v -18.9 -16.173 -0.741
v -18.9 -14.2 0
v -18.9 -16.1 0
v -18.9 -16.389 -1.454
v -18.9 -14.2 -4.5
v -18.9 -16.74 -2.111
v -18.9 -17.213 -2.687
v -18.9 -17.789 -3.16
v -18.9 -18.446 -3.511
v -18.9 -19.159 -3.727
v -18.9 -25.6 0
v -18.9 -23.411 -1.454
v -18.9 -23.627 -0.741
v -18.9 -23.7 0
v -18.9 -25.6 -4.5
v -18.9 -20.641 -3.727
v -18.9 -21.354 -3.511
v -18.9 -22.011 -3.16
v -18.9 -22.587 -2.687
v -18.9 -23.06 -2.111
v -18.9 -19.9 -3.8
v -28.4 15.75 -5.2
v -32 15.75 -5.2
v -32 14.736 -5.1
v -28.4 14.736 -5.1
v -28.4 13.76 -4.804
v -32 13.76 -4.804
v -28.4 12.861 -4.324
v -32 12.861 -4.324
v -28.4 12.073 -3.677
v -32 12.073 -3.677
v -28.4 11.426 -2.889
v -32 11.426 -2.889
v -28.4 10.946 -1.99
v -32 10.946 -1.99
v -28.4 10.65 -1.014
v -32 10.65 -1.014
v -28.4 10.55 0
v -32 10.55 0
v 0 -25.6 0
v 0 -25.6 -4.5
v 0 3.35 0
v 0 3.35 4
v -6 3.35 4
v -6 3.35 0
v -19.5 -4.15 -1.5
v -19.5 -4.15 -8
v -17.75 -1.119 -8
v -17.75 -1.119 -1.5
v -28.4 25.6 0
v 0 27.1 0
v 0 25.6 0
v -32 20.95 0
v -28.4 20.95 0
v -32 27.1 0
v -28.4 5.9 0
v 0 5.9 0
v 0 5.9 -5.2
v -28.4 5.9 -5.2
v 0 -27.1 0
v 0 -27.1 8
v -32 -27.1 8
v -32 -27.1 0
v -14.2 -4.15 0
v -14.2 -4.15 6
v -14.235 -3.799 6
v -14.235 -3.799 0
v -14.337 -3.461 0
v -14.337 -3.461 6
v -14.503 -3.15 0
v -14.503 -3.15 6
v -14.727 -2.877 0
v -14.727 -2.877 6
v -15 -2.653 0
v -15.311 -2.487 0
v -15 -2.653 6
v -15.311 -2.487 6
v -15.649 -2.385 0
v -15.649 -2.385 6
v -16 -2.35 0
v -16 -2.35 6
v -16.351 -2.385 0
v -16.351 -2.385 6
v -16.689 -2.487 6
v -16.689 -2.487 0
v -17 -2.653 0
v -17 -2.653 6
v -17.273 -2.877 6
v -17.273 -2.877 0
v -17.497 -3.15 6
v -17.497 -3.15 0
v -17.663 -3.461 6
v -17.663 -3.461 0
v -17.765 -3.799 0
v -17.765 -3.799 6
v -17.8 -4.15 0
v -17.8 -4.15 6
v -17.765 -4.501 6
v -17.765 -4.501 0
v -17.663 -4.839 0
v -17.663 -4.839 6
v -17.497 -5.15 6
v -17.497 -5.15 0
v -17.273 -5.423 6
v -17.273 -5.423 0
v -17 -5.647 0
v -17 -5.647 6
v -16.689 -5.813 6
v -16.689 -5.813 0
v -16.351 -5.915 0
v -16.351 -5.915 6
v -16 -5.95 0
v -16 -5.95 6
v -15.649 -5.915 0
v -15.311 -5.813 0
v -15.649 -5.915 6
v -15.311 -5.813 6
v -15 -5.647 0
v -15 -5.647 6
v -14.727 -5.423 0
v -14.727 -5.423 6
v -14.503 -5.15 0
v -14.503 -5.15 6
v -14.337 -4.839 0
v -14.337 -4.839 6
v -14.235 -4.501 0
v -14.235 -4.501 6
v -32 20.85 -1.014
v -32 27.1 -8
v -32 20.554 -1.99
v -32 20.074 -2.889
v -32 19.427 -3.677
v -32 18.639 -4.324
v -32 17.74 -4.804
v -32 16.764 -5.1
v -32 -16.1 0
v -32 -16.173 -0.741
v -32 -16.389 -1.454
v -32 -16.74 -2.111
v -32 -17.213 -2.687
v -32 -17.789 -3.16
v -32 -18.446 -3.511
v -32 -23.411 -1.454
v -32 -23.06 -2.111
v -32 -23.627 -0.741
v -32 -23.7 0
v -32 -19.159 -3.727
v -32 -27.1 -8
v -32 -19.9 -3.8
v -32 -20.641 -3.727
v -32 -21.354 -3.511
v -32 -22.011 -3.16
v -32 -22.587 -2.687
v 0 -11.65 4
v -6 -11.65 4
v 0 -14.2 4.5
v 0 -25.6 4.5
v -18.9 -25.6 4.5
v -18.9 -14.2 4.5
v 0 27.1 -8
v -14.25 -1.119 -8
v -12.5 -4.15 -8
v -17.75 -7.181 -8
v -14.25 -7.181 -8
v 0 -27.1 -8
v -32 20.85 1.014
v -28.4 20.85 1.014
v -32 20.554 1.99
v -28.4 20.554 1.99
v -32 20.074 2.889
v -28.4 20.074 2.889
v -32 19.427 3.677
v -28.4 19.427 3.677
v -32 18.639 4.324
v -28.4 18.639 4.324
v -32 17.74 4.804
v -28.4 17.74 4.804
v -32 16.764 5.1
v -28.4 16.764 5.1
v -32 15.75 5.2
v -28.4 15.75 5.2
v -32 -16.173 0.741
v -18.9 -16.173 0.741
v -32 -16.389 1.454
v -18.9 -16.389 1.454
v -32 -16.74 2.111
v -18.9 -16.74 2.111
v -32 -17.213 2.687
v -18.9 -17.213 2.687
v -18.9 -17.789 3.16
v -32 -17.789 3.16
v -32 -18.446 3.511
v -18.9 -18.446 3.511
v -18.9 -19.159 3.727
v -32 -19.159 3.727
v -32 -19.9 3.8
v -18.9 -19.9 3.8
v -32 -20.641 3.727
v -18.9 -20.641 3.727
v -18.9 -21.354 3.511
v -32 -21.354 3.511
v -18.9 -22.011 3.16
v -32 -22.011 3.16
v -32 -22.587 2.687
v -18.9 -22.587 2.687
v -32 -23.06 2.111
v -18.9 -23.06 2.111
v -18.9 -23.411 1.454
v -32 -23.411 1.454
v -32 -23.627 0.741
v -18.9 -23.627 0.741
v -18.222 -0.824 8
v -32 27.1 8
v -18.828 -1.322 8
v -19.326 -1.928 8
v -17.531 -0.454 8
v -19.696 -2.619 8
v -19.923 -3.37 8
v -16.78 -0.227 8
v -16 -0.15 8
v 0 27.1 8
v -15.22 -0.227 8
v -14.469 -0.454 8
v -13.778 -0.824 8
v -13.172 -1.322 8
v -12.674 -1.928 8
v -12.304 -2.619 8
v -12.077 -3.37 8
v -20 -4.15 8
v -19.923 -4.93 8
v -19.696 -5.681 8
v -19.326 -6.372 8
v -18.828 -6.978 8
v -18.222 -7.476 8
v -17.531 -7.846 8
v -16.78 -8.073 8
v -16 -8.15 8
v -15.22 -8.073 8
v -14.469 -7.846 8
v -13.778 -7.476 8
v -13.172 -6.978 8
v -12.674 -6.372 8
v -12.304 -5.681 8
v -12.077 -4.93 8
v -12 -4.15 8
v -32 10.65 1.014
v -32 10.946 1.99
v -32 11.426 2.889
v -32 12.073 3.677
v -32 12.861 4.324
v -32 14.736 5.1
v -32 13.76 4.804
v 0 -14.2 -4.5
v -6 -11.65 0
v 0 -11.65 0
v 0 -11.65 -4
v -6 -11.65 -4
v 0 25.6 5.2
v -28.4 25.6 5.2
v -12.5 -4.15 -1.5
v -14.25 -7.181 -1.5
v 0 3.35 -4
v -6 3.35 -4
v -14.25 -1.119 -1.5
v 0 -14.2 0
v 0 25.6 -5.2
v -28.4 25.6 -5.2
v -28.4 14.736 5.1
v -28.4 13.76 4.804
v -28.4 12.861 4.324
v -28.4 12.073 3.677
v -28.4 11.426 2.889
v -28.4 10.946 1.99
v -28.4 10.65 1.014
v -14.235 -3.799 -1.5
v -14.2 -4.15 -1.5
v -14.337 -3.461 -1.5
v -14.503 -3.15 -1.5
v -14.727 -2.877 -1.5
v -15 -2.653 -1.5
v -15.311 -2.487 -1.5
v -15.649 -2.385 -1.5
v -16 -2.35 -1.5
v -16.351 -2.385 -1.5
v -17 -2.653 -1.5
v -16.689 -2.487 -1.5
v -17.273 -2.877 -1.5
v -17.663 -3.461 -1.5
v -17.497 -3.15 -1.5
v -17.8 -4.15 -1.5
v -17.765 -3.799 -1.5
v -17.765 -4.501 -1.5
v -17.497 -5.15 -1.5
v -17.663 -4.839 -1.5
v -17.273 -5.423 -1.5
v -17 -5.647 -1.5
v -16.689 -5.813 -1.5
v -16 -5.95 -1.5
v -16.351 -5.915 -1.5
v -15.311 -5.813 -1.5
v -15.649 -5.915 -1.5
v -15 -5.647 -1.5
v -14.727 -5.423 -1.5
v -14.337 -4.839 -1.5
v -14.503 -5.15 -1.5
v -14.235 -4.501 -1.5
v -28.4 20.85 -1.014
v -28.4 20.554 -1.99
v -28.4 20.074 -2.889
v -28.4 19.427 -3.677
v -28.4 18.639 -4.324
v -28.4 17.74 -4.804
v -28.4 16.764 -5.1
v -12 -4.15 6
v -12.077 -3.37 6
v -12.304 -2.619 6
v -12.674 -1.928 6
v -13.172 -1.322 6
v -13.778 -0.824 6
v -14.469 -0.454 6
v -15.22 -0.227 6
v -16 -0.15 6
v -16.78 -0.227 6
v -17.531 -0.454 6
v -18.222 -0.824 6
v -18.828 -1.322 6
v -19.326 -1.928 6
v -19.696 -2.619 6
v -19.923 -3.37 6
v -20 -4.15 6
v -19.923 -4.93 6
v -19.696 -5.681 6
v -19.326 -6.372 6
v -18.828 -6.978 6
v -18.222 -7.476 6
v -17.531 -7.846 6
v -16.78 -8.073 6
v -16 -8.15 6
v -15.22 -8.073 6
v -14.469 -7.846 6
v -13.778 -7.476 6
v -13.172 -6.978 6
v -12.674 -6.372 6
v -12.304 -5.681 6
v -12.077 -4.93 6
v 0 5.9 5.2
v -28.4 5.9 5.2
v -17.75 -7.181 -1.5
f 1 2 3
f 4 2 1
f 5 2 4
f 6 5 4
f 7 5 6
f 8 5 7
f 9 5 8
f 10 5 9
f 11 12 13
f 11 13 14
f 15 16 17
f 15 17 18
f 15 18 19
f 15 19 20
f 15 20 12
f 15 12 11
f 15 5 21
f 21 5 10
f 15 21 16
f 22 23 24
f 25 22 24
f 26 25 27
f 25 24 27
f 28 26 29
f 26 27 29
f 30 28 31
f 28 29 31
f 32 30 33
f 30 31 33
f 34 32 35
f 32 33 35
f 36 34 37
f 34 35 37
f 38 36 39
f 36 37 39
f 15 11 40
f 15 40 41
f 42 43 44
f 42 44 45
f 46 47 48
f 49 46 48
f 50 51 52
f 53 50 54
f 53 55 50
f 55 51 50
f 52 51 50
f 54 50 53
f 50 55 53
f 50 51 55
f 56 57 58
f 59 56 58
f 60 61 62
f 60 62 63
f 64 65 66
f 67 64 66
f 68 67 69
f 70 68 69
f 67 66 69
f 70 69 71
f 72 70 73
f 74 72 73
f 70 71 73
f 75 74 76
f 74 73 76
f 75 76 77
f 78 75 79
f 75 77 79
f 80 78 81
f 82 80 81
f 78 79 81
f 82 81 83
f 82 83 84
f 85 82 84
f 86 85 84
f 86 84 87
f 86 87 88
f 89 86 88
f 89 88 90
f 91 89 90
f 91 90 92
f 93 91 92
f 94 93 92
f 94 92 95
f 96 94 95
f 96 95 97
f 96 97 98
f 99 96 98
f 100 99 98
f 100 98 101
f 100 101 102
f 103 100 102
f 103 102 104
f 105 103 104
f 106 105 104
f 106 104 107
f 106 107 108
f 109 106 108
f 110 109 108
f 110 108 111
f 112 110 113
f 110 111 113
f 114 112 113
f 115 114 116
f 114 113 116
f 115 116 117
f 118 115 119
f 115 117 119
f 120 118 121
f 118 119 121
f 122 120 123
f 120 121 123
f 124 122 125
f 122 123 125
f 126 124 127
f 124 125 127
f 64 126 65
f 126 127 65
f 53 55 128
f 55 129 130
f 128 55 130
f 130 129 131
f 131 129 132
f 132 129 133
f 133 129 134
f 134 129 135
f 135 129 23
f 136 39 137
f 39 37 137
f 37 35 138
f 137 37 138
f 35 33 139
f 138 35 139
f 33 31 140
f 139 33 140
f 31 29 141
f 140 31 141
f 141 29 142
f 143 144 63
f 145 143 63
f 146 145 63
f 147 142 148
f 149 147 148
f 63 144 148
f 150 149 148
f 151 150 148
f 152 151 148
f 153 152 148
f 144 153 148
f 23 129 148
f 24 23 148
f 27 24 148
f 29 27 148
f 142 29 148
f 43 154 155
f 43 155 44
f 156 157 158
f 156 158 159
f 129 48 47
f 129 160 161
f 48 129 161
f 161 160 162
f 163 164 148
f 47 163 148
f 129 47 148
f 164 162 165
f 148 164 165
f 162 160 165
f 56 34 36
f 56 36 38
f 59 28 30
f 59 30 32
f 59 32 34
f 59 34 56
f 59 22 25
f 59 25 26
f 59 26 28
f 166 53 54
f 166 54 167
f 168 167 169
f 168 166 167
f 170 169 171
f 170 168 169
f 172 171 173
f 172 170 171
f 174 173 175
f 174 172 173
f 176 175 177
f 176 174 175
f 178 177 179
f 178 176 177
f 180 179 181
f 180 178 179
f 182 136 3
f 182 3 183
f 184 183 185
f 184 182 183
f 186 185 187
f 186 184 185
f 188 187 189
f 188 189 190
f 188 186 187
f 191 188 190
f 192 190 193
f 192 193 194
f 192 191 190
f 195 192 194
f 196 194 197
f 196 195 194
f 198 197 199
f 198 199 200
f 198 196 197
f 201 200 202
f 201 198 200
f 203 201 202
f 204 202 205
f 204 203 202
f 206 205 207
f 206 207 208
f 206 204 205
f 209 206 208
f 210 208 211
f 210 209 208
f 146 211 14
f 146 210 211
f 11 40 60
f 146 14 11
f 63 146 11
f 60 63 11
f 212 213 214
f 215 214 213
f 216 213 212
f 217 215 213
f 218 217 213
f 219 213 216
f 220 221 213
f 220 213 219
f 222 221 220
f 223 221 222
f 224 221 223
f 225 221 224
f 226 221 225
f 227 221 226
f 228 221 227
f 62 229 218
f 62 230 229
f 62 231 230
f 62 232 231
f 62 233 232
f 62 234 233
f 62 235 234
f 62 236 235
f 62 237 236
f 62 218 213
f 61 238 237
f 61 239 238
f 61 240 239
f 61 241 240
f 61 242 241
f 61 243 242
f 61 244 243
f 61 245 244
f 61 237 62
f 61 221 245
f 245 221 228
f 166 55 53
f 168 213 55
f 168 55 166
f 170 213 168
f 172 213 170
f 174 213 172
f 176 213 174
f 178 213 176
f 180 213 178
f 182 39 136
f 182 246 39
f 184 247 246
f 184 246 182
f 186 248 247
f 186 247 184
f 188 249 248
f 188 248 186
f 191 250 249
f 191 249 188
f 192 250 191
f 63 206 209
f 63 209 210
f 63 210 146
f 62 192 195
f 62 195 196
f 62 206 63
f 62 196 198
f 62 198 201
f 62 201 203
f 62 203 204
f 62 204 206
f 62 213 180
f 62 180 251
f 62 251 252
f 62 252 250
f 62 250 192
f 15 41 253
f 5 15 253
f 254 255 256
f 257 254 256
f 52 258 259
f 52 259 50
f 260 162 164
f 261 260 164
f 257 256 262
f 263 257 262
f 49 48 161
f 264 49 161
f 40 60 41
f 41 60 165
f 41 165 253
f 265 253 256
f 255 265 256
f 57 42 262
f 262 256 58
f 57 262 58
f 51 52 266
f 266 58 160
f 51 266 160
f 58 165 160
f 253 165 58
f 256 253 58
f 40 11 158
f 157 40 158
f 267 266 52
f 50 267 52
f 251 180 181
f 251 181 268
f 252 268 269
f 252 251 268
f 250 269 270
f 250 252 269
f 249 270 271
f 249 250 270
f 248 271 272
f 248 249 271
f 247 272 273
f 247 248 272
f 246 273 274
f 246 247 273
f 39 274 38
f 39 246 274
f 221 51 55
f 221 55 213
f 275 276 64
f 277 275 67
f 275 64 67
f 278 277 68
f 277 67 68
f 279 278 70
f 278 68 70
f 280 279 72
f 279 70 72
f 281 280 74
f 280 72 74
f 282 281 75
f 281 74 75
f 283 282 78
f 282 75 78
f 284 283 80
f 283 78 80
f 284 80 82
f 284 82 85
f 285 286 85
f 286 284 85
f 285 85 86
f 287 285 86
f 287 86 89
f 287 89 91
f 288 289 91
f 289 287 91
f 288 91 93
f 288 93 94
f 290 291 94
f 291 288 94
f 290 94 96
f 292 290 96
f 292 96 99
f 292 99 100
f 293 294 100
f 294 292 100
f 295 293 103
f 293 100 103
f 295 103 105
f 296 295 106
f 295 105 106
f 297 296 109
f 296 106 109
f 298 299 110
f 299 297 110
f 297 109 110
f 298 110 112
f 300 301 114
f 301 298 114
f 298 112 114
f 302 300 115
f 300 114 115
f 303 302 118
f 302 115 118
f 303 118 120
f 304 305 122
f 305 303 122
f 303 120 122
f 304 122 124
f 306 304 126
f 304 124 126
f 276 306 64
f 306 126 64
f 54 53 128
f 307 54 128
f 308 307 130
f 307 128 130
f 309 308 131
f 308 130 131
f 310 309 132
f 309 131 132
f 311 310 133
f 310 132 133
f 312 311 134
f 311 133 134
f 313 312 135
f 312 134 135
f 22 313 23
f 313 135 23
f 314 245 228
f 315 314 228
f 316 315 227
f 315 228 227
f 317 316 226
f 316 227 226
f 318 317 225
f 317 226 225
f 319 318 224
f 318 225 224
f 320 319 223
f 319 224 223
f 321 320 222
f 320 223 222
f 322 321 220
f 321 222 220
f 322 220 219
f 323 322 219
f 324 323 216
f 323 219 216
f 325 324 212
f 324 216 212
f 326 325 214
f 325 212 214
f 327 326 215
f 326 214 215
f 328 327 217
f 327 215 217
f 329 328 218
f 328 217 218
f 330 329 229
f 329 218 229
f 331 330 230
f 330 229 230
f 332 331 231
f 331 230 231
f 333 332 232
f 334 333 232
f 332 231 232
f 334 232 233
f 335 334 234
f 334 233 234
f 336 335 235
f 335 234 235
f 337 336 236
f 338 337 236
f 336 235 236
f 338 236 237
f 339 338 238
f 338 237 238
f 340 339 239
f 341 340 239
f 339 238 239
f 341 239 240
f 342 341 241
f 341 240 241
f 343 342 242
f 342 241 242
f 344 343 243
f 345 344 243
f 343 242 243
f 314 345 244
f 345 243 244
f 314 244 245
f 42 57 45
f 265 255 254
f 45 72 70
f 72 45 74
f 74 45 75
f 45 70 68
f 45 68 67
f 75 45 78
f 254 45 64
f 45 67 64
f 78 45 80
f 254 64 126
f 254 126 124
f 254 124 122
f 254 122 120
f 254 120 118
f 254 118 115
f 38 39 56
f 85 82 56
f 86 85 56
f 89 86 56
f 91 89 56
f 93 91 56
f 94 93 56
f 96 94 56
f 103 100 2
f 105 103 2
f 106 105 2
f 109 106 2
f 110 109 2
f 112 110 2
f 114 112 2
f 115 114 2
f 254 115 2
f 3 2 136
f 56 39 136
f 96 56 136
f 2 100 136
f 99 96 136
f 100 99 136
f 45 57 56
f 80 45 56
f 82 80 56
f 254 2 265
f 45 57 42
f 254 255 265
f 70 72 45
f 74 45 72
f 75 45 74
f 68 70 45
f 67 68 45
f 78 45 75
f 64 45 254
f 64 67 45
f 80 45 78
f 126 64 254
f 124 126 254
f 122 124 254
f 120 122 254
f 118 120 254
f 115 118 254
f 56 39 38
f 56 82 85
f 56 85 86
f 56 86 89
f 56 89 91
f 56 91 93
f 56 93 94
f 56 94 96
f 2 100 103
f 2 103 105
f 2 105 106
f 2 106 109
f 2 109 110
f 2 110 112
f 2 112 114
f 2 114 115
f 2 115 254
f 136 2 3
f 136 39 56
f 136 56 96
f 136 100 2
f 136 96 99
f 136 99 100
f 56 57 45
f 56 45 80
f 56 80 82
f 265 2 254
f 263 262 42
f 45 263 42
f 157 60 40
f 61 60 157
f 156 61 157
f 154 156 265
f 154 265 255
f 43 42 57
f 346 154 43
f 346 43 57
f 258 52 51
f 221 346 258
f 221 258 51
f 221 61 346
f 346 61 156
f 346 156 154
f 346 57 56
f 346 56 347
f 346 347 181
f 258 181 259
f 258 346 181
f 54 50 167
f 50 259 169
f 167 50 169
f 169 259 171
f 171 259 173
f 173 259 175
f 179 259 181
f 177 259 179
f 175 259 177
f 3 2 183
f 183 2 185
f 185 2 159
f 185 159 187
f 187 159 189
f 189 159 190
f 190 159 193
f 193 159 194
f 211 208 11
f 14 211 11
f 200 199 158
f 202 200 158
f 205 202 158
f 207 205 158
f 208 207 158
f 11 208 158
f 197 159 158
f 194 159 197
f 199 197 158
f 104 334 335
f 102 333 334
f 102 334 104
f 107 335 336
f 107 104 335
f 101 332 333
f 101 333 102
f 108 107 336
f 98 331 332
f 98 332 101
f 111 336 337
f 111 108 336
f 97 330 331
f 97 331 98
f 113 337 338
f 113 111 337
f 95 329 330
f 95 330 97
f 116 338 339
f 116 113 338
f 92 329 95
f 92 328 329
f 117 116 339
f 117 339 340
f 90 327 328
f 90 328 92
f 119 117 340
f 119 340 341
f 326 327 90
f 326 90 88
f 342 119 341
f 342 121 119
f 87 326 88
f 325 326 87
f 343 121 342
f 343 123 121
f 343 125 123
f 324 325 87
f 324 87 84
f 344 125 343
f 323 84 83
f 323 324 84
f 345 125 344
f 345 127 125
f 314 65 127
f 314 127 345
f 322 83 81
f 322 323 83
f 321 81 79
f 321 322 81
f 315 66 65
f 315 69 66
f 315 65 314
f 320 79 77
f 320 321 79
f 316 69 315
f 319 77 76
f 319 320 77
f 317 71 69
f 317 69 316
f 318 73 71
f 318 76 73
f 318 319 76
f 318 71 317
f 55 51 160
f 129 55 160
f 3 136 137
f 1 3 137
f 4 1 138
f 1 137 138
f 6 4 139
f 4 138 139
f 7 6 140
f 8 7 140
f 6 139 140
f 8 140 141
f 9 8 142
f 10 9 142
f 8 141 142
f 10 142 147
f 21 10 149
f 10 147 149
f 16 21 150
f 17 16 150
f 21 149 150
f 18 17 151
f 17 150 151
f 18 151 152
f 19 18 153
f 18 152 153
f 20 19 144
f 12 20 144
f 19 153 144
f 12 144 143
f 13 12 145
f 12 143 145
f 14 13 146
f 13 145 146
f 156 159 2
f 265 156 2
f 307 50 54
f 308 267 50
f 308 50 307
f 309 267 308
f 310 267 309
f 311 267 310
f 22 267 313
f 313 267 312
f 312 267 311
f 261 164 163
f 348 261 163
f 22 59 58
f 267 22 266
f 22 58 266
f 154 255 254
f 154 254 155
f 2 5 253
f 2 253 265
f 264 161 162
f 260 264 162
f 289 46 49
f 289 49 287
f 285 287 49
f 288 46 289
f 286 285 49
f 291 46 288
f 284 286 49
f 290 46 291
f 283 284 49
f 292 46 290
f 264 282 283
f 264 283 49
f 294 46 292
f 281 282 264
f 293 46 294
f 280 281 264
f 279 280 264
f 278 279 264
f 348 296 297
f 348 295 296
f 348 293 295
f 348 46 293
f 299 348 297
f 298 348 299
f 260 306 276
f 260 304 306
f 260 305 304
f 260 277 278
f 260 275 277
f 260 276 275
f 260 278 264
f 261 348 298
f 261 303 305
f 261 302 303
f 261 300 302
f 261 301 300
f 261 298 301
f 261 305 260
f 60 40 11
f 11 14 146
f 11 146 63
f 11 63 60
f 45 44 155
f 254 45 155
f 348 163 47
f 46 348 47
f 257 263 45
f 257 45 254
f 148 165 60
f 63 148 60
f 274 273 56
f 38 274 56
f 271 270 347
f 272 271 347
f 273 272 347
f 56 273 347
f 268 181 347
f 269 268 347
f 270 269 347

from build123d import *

# Parameters (mm, degrees)
F1_DEPTH  = 32
F3_DEPTH  = 3.6
F4_DEPTH  = 13.1
F2_W      = 15
F2_H      = 4
F5_DEPTH  = 26
F7_R      = 1.8
F8_DEPTH  = 16
F7_R_2    = 4
F9_DEPTH  = 2
F10_R     = 1.8
F11_DEPTH = 6.5


with BuildPart() as f1:
    # F0 (on Right) → F1 (new body)
    with BuildSketch(Plane.YZ):
        Polygon((-27.1, 8), (-27.1, 0), (-25.6, 0), (-25.6, 4.5), (-14.2, 4.5), (-14.2, 0), (-11.65, 0), (-11.65, 4), (3.35, 4), (3.35, 0), (5.9, 0), (5.9, 5.2), (25.6, 5.2), (25.6, 0), (27.1, 0), (27.1, 8), align=None)
    extrude(amount=-F1_DEPTH)

    # F2 (on face) → F3 (join)
    with BuildSketch(Plane(origin=(-32, 0, 0), x_dir=(0, -1, 0), z_dir=(-1, 0, 0))):
        with BuildLine():
            Line((-5.9, 5.2), (-15.75, 5.2))
            ThreePointArc((-15.75, 5.2), (-12.0730447378, 3.6769552622), (-10.55, 0))
            Line((-10.55, 0), (-5.9, 0))
            Line((-5.9, 0), (-5.9, 5.2))
        make_face()
        with BuildLine():
            Line((-25.6, 5.2), (-25.6, 0))
            Line((-25.6, 0), (-20.95, 0))
            ThreePointArc((-20.95, 0), (-19.4269552622, 3.6769552622), (-15.75, 5.2))
            Line((-15.75, 5.2), (-25.6, 5.2))
        make_face()
    extrude(amount=-F3_DEPTH)

    # F2 (on face) → F4 (join)
    with BuildSketch(Plane(origin=(-32, 0, 0), x_dir=(0, -1, 0), z_dir=(-1, 0, 0))):
        with BuildLine():
            Line((23.7, 0), (25.6, 0))
            Line((25.6, 0), (25.6, 4.5))
            Line((25.6, 4.5), (14.2, 4.5))
            Line((14.2, 4.5), (14.2, 0))
            Line((14.2, 0), (16.1, 0))
            ThreePointArc((16.1, 0), (19.9, 3.8), (23.7, 0))
        make_face()
    extrude(amount=-F4_DEPTH)

    # F2 (on face) → F5 (join)
    with BuildSketch(Plane(origin=(-32, 0, 0), x_dir=(0, -1, 0), z_dir=(-1, 0, 0))):
        with Locations((4.15, 2)):
            Rectangle(F2_W, F2_H)
    extrude(amount=-F5_DEPTH)


with BuildPart() as f6_1:
    # F6: instance of F1
    add(f1.part.mirror(Plane.XY))


with BuildPart() as f8_tool:
    # F7 (on face) → F8 (new body, through all)
    with BuildSketch(Plane.XY.offset(8)):
        with Locations((-16, -4.15)):
            Circle(F7_R)
    extrude(amount=-F8_DEPTH)


with BuildPart() as f1_1:
    add(f1.part)

    # F8: cut by f8_tool
    add(f8_tool.part, mode=Mode.SUBTRACT)

    # F7 (on face) → F9 (cut)
    with BuildSketch(Plane.XY.offset(8)):
        with Locations((-16, -4.15)):
            Circle(F7_R_2)
        with Locations((-16, -4.15)):
            Circle(F7_R, mode=Mode.SUBTRACT)
    extrude(amount=-F9_DEPTH, mode=Mode.SUBTRACT)


with BuildPart() as f6_1_1:
    add(f6_1.part)

    # F8: cut by f8_tool
    add(f8_tool.part, mode=Mode.SUBTRACT)

    # F10 (on face) → F11 (cut)
    with BuildSketch(Plane(origin=(0, 0, -8), x_dir=(1, 0, 0), z_dir=(0, 0, -1))):
        Polygon((-17.75, 1.1189110861), (-14.25, 1.1189110861), (-12.5, 4.1499999994), (-14.25, 7.1810889126), (-17.75, 7.1810889126), (-19.5, 4.1499999994), align=None)
        with Locations((-16, 4.1499999994)):
            Circle(F10_R, mode=Mode.SUBTRACT)
    extrude(amount=-F11_DEPTH, mode=Mode.SUBTRACT)


solid = Compound([f1_1.part, f6_1_1.part])
